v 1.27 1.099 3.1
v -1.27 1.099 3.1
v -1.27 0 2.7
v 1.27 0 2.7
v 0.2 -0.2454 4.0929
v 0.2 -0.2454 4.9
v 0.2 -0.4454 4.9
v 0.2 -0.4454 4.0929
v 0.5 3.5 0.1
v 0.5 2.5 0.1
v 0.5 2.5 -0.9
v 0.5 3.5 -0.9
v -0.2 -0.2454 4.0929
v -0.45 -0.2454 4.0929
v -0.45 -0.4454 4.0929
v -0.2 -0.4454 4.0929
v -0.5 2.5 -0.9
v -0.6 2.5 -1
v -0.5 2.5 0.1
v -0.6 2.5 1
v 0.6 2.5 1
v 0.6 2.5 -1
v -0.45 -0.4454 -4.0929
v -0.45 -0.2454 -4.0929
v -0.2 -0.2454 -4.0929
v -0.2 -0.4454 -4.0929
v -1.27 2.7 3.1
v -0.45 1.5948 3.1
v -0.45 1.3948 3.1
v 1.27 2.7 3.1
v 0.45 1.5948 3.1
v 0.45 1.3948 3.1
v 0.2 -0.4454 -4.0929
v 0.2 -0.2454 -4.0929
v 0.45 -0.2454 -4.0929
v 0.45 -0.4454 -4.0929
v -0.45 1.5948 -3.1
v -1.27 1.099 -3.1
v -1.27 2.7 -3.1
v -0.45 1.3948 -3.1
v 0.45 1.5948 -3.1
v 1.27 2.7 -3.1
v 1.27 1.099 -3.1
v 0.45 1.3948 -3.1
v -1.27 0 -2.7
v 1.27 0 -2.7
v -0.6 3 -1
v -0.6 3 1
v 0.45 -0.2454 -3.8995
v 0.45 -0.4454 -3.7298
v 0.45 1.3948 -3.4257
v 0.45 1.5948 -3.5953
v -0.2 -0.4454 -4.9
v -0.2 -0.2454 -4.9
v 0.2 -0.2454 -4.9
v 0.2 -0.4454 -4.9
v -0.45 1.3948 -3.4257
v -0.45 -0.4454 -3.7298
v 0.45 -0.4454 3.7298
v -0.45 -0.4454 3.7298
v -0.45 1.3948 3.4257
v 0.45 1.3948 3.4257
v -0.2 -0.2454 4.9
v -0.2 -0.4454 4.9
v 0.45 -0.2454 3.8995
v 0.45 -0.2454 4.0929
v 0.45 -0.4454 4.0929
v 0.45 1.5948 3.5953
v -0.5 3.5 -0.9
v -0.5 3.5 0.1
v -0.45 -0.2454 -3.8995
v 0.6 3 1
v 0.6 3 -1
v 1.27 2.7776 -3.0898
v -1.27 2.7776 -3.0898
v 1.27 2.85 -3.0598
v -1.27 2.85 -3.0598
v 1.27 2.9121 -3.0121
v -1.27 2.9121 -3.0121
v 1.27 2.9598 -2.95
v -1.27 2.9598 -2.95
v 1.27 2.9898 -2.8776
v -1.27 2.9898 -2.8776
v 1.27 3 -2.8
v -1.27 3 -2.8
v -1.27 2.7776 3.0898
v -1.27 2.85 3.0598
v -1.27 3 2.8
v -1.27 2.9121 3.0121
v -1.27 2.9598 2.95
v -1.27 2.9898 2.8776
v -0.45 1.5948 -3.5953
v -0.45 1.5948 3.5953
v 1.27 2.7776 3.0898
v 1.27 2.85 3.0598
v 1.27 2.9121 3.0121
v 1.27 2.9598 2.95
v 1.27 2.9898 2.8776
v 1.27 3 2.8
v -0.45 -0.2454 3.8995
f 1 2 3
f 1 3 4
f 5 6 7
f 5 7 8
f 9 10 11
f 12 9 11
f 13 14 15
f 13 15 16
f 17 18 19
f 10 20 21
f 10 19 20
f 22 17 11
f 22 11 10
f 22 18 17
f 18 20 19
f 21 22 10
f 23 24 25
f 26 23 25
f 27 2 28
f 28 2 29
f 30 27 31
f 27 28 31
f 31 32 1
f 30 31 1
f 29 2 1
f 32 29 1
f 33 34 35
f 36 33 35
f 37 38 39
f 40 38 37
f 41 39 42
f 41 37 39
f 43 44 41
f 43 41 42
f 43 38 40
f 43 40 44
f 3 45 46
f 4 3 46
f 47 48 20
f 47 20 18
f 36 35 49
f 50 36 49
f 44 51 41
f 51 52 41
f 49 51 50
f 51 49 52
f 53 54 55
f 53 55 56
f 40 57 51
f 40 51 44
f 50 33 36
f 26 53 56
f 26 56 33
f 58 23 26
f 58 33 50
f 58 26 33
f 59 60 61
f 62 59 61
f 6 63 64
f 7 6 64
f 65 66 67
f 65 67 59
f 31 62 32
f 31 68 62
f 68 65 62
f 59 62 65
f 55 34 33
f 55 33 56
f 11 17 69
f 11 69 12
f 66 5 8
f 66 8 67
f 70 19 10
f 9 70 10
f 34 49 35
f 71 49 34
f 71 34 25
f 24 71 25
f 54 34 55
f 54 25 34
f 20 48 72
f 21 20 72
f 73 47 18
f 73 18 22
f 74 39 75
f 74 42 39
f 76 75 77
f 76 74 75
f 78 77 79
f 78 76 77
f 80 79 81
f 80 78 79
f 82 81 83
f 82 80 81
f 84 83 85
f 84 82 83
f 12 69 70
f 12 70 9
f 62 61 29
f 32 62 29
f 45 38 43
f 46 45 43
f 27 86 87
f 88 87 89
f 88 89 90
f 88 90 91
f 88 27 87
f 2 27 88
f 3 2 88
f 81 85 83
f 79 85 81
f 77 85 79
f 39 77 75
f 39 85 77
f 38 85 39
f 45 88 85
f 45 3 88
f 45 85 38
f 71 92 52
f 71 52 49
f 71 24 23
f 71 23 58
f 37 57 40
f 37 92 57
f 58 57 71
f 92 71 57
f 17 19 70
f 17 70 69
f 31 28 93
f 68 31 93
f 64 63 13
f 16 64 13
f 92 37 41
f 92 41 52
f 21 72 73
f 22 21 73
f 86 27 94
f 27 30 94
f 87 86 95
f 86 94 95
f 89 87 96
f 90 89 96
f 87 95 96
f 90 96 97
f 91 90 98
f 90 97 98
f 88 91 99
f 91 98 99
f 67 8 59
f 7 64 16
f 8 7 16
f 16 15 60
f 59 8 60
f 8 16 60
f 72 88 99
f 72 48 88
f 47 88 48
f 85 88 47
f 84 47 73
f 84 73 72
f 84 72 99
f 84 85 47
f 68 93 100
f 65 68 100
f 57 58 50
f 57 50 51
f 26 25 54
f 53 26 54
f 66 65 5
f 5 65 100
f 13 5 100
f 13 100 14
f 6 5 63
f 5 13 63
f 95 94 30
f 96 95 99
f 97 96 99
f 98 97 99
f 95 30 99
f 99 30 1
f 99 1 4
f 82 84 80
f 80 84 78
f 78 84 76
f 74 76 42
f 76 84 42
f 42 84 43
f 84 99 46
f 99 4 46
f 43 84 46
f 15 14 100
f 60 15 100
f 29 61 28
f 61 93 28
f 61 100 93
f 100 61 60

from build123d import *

# Parameters (mm, degrees)
SKETCH_1_W           = 2.54
SKETCH_1_H           = 6.2
EXTRUDE_1_DEPTH      = 3
SKETCH_2_W           = 1.2
SKETCH_2_H           = 2
CUT_EXTRUDE_1_DEPTH  = 0.5
SKETCH_3_W           = 1
SKETCH_3_H           = 1
EXTRUDE_1_2_DEPTH    = 1
FILLET_1_R           = 0.3
CHAMFER_1_SIZE       = 0.4
CHAMFER_1_SIZE2      = 1.098990968
EXTRUDE_2_DEPTH      = 0.45
EXTRUDE_2_DEPTH_BACK = 0.45
SKETCH_5_W           = 0.25
SKETCH_5_H           = 0.807139358
CUT_EXTRUDE_2_DEPTH  = 0.45


with BuildPart() as part:
    # 草图1 → Extrude 1 (new body)
    with BuildSketch(Plane(origin=(0, 0, 0), x_dir=(1, 0, 0), z_dir=(0, 1, 0))):
        Rectangle(SKETCH_1_W, SKETCH_1_H)
    extrude(amount=EXTRUDE_1_DEPTH)

    # 草图2 → 切除-拉伸1 (cut)
    with BuildSketch(Plane(origin=(0, 3, 0), x_dir=(1, 0, 0), z_dir=(0, 1, 0))):
        Rectangle(SKETCH_2_W, SKETCH_2_H)
    extrude(amount=-CUT_EXTRUDE_1_DEPTH, mode=Mode.SUBTRACT)

    # 草图3 → Extrude 1 2 (add)
    with BuildSketch(Plane(origin=(0, 2.5, 0), x_dir=(1, 0, 0), z_dir=(0, 1, 0))):
        with Locations((0, 0.4)):
            Rectangle(SKETCH_3_W, SKETCH_3_H)
    extrude(amount=EXTRUDE_1_2_DEPTH)

    # 圆角1
    fillet_1_edges = [part.edges().sort_by_distance(p)[0] for p in [
        (0, 3, -3.1),
        (0, 3, 3.1),
    ]]
    fillet(fillet_1_edges, radius=FILLET_1_R)

    # 倒角1
    chamfer_1_edges = [part.edges().sort_by_distance(p)[0] for p in [
        (0, 0, -3.1),
        (0, 0, 3.1),
    ]]
    chamfer_1_side = [part.faces().sort_by_distance(p)[0] for p in [
        (0, 0, 0),
    ]]
    chamfer(chamfer_1_edges, length=CHAMFER_1_SIZE, length2=CHAMFER_1_SIZE2, reference=chamfer_1_side[0])

    # 草图4 → 凸台-拉伸2 (add, two sides: drawn at the far end of the back side and taken through both)
    with BuildSketch(Plane(origin=(0, 0, 0), x_dir=(0, 0, -1), z_dir=(1, 0, 0)).offset(-EXTRUDE_2_DEPTH_BACK)):
        Polygon((-2.942106966, 1.594783958), (-3.595340284, 1.594783958), (-3.89950168, -0.245392483), (-4.9, -0.245392483), (-4.9, -0.445392483), (-3.729845887, -0.445392483), (-3.425684492, 1.394783958), (-2.942106966, 1.394783958), align=None)
        Polygon((2.942106966, 1.394783958), (2.942106966, 1.594783958), (3.595340284, 1.594783958), (3.89950168, -0.245392483), (4.9, -0.245392483), (4.9, -0.445392483), (3.729845887, -0.445392483), (3.425684492, 1.394783958), align=None)
    extrude(amount=EXTRUDE_2_DEPTH + EXTRUDE_2_DEPTH_BACK)

    # 草图5 → 切除-拉伸2 (cut)
    with BuildSketch(Plane(origin=(0, -0.245392483, 0), x_dir=(1, 0, 0), z_dir=(0, 1, 0))):
        with Locations((0.325, 4.496430321)):
            Rectangle(SKETCH_5_W, SKETCH_5_H)
        with Locations((-0.325, 4.496430321)):
            Rectangle(SKETCH_5_W, SKETCH_5_H)
        with Locations((0.325, -4.496430321)):
            Rectangle(SKETCH_5_W, SKETCH_5_H)
        with Locations((-0.325, -4.496430321)):
            Rectangle(SKETCH_5_W, SKETCH_5_H)
    extrude(amount=-CUT_EXTRUDE_2_DEPTH, mode=Mode.SUBTRACT)


solid = part.part
